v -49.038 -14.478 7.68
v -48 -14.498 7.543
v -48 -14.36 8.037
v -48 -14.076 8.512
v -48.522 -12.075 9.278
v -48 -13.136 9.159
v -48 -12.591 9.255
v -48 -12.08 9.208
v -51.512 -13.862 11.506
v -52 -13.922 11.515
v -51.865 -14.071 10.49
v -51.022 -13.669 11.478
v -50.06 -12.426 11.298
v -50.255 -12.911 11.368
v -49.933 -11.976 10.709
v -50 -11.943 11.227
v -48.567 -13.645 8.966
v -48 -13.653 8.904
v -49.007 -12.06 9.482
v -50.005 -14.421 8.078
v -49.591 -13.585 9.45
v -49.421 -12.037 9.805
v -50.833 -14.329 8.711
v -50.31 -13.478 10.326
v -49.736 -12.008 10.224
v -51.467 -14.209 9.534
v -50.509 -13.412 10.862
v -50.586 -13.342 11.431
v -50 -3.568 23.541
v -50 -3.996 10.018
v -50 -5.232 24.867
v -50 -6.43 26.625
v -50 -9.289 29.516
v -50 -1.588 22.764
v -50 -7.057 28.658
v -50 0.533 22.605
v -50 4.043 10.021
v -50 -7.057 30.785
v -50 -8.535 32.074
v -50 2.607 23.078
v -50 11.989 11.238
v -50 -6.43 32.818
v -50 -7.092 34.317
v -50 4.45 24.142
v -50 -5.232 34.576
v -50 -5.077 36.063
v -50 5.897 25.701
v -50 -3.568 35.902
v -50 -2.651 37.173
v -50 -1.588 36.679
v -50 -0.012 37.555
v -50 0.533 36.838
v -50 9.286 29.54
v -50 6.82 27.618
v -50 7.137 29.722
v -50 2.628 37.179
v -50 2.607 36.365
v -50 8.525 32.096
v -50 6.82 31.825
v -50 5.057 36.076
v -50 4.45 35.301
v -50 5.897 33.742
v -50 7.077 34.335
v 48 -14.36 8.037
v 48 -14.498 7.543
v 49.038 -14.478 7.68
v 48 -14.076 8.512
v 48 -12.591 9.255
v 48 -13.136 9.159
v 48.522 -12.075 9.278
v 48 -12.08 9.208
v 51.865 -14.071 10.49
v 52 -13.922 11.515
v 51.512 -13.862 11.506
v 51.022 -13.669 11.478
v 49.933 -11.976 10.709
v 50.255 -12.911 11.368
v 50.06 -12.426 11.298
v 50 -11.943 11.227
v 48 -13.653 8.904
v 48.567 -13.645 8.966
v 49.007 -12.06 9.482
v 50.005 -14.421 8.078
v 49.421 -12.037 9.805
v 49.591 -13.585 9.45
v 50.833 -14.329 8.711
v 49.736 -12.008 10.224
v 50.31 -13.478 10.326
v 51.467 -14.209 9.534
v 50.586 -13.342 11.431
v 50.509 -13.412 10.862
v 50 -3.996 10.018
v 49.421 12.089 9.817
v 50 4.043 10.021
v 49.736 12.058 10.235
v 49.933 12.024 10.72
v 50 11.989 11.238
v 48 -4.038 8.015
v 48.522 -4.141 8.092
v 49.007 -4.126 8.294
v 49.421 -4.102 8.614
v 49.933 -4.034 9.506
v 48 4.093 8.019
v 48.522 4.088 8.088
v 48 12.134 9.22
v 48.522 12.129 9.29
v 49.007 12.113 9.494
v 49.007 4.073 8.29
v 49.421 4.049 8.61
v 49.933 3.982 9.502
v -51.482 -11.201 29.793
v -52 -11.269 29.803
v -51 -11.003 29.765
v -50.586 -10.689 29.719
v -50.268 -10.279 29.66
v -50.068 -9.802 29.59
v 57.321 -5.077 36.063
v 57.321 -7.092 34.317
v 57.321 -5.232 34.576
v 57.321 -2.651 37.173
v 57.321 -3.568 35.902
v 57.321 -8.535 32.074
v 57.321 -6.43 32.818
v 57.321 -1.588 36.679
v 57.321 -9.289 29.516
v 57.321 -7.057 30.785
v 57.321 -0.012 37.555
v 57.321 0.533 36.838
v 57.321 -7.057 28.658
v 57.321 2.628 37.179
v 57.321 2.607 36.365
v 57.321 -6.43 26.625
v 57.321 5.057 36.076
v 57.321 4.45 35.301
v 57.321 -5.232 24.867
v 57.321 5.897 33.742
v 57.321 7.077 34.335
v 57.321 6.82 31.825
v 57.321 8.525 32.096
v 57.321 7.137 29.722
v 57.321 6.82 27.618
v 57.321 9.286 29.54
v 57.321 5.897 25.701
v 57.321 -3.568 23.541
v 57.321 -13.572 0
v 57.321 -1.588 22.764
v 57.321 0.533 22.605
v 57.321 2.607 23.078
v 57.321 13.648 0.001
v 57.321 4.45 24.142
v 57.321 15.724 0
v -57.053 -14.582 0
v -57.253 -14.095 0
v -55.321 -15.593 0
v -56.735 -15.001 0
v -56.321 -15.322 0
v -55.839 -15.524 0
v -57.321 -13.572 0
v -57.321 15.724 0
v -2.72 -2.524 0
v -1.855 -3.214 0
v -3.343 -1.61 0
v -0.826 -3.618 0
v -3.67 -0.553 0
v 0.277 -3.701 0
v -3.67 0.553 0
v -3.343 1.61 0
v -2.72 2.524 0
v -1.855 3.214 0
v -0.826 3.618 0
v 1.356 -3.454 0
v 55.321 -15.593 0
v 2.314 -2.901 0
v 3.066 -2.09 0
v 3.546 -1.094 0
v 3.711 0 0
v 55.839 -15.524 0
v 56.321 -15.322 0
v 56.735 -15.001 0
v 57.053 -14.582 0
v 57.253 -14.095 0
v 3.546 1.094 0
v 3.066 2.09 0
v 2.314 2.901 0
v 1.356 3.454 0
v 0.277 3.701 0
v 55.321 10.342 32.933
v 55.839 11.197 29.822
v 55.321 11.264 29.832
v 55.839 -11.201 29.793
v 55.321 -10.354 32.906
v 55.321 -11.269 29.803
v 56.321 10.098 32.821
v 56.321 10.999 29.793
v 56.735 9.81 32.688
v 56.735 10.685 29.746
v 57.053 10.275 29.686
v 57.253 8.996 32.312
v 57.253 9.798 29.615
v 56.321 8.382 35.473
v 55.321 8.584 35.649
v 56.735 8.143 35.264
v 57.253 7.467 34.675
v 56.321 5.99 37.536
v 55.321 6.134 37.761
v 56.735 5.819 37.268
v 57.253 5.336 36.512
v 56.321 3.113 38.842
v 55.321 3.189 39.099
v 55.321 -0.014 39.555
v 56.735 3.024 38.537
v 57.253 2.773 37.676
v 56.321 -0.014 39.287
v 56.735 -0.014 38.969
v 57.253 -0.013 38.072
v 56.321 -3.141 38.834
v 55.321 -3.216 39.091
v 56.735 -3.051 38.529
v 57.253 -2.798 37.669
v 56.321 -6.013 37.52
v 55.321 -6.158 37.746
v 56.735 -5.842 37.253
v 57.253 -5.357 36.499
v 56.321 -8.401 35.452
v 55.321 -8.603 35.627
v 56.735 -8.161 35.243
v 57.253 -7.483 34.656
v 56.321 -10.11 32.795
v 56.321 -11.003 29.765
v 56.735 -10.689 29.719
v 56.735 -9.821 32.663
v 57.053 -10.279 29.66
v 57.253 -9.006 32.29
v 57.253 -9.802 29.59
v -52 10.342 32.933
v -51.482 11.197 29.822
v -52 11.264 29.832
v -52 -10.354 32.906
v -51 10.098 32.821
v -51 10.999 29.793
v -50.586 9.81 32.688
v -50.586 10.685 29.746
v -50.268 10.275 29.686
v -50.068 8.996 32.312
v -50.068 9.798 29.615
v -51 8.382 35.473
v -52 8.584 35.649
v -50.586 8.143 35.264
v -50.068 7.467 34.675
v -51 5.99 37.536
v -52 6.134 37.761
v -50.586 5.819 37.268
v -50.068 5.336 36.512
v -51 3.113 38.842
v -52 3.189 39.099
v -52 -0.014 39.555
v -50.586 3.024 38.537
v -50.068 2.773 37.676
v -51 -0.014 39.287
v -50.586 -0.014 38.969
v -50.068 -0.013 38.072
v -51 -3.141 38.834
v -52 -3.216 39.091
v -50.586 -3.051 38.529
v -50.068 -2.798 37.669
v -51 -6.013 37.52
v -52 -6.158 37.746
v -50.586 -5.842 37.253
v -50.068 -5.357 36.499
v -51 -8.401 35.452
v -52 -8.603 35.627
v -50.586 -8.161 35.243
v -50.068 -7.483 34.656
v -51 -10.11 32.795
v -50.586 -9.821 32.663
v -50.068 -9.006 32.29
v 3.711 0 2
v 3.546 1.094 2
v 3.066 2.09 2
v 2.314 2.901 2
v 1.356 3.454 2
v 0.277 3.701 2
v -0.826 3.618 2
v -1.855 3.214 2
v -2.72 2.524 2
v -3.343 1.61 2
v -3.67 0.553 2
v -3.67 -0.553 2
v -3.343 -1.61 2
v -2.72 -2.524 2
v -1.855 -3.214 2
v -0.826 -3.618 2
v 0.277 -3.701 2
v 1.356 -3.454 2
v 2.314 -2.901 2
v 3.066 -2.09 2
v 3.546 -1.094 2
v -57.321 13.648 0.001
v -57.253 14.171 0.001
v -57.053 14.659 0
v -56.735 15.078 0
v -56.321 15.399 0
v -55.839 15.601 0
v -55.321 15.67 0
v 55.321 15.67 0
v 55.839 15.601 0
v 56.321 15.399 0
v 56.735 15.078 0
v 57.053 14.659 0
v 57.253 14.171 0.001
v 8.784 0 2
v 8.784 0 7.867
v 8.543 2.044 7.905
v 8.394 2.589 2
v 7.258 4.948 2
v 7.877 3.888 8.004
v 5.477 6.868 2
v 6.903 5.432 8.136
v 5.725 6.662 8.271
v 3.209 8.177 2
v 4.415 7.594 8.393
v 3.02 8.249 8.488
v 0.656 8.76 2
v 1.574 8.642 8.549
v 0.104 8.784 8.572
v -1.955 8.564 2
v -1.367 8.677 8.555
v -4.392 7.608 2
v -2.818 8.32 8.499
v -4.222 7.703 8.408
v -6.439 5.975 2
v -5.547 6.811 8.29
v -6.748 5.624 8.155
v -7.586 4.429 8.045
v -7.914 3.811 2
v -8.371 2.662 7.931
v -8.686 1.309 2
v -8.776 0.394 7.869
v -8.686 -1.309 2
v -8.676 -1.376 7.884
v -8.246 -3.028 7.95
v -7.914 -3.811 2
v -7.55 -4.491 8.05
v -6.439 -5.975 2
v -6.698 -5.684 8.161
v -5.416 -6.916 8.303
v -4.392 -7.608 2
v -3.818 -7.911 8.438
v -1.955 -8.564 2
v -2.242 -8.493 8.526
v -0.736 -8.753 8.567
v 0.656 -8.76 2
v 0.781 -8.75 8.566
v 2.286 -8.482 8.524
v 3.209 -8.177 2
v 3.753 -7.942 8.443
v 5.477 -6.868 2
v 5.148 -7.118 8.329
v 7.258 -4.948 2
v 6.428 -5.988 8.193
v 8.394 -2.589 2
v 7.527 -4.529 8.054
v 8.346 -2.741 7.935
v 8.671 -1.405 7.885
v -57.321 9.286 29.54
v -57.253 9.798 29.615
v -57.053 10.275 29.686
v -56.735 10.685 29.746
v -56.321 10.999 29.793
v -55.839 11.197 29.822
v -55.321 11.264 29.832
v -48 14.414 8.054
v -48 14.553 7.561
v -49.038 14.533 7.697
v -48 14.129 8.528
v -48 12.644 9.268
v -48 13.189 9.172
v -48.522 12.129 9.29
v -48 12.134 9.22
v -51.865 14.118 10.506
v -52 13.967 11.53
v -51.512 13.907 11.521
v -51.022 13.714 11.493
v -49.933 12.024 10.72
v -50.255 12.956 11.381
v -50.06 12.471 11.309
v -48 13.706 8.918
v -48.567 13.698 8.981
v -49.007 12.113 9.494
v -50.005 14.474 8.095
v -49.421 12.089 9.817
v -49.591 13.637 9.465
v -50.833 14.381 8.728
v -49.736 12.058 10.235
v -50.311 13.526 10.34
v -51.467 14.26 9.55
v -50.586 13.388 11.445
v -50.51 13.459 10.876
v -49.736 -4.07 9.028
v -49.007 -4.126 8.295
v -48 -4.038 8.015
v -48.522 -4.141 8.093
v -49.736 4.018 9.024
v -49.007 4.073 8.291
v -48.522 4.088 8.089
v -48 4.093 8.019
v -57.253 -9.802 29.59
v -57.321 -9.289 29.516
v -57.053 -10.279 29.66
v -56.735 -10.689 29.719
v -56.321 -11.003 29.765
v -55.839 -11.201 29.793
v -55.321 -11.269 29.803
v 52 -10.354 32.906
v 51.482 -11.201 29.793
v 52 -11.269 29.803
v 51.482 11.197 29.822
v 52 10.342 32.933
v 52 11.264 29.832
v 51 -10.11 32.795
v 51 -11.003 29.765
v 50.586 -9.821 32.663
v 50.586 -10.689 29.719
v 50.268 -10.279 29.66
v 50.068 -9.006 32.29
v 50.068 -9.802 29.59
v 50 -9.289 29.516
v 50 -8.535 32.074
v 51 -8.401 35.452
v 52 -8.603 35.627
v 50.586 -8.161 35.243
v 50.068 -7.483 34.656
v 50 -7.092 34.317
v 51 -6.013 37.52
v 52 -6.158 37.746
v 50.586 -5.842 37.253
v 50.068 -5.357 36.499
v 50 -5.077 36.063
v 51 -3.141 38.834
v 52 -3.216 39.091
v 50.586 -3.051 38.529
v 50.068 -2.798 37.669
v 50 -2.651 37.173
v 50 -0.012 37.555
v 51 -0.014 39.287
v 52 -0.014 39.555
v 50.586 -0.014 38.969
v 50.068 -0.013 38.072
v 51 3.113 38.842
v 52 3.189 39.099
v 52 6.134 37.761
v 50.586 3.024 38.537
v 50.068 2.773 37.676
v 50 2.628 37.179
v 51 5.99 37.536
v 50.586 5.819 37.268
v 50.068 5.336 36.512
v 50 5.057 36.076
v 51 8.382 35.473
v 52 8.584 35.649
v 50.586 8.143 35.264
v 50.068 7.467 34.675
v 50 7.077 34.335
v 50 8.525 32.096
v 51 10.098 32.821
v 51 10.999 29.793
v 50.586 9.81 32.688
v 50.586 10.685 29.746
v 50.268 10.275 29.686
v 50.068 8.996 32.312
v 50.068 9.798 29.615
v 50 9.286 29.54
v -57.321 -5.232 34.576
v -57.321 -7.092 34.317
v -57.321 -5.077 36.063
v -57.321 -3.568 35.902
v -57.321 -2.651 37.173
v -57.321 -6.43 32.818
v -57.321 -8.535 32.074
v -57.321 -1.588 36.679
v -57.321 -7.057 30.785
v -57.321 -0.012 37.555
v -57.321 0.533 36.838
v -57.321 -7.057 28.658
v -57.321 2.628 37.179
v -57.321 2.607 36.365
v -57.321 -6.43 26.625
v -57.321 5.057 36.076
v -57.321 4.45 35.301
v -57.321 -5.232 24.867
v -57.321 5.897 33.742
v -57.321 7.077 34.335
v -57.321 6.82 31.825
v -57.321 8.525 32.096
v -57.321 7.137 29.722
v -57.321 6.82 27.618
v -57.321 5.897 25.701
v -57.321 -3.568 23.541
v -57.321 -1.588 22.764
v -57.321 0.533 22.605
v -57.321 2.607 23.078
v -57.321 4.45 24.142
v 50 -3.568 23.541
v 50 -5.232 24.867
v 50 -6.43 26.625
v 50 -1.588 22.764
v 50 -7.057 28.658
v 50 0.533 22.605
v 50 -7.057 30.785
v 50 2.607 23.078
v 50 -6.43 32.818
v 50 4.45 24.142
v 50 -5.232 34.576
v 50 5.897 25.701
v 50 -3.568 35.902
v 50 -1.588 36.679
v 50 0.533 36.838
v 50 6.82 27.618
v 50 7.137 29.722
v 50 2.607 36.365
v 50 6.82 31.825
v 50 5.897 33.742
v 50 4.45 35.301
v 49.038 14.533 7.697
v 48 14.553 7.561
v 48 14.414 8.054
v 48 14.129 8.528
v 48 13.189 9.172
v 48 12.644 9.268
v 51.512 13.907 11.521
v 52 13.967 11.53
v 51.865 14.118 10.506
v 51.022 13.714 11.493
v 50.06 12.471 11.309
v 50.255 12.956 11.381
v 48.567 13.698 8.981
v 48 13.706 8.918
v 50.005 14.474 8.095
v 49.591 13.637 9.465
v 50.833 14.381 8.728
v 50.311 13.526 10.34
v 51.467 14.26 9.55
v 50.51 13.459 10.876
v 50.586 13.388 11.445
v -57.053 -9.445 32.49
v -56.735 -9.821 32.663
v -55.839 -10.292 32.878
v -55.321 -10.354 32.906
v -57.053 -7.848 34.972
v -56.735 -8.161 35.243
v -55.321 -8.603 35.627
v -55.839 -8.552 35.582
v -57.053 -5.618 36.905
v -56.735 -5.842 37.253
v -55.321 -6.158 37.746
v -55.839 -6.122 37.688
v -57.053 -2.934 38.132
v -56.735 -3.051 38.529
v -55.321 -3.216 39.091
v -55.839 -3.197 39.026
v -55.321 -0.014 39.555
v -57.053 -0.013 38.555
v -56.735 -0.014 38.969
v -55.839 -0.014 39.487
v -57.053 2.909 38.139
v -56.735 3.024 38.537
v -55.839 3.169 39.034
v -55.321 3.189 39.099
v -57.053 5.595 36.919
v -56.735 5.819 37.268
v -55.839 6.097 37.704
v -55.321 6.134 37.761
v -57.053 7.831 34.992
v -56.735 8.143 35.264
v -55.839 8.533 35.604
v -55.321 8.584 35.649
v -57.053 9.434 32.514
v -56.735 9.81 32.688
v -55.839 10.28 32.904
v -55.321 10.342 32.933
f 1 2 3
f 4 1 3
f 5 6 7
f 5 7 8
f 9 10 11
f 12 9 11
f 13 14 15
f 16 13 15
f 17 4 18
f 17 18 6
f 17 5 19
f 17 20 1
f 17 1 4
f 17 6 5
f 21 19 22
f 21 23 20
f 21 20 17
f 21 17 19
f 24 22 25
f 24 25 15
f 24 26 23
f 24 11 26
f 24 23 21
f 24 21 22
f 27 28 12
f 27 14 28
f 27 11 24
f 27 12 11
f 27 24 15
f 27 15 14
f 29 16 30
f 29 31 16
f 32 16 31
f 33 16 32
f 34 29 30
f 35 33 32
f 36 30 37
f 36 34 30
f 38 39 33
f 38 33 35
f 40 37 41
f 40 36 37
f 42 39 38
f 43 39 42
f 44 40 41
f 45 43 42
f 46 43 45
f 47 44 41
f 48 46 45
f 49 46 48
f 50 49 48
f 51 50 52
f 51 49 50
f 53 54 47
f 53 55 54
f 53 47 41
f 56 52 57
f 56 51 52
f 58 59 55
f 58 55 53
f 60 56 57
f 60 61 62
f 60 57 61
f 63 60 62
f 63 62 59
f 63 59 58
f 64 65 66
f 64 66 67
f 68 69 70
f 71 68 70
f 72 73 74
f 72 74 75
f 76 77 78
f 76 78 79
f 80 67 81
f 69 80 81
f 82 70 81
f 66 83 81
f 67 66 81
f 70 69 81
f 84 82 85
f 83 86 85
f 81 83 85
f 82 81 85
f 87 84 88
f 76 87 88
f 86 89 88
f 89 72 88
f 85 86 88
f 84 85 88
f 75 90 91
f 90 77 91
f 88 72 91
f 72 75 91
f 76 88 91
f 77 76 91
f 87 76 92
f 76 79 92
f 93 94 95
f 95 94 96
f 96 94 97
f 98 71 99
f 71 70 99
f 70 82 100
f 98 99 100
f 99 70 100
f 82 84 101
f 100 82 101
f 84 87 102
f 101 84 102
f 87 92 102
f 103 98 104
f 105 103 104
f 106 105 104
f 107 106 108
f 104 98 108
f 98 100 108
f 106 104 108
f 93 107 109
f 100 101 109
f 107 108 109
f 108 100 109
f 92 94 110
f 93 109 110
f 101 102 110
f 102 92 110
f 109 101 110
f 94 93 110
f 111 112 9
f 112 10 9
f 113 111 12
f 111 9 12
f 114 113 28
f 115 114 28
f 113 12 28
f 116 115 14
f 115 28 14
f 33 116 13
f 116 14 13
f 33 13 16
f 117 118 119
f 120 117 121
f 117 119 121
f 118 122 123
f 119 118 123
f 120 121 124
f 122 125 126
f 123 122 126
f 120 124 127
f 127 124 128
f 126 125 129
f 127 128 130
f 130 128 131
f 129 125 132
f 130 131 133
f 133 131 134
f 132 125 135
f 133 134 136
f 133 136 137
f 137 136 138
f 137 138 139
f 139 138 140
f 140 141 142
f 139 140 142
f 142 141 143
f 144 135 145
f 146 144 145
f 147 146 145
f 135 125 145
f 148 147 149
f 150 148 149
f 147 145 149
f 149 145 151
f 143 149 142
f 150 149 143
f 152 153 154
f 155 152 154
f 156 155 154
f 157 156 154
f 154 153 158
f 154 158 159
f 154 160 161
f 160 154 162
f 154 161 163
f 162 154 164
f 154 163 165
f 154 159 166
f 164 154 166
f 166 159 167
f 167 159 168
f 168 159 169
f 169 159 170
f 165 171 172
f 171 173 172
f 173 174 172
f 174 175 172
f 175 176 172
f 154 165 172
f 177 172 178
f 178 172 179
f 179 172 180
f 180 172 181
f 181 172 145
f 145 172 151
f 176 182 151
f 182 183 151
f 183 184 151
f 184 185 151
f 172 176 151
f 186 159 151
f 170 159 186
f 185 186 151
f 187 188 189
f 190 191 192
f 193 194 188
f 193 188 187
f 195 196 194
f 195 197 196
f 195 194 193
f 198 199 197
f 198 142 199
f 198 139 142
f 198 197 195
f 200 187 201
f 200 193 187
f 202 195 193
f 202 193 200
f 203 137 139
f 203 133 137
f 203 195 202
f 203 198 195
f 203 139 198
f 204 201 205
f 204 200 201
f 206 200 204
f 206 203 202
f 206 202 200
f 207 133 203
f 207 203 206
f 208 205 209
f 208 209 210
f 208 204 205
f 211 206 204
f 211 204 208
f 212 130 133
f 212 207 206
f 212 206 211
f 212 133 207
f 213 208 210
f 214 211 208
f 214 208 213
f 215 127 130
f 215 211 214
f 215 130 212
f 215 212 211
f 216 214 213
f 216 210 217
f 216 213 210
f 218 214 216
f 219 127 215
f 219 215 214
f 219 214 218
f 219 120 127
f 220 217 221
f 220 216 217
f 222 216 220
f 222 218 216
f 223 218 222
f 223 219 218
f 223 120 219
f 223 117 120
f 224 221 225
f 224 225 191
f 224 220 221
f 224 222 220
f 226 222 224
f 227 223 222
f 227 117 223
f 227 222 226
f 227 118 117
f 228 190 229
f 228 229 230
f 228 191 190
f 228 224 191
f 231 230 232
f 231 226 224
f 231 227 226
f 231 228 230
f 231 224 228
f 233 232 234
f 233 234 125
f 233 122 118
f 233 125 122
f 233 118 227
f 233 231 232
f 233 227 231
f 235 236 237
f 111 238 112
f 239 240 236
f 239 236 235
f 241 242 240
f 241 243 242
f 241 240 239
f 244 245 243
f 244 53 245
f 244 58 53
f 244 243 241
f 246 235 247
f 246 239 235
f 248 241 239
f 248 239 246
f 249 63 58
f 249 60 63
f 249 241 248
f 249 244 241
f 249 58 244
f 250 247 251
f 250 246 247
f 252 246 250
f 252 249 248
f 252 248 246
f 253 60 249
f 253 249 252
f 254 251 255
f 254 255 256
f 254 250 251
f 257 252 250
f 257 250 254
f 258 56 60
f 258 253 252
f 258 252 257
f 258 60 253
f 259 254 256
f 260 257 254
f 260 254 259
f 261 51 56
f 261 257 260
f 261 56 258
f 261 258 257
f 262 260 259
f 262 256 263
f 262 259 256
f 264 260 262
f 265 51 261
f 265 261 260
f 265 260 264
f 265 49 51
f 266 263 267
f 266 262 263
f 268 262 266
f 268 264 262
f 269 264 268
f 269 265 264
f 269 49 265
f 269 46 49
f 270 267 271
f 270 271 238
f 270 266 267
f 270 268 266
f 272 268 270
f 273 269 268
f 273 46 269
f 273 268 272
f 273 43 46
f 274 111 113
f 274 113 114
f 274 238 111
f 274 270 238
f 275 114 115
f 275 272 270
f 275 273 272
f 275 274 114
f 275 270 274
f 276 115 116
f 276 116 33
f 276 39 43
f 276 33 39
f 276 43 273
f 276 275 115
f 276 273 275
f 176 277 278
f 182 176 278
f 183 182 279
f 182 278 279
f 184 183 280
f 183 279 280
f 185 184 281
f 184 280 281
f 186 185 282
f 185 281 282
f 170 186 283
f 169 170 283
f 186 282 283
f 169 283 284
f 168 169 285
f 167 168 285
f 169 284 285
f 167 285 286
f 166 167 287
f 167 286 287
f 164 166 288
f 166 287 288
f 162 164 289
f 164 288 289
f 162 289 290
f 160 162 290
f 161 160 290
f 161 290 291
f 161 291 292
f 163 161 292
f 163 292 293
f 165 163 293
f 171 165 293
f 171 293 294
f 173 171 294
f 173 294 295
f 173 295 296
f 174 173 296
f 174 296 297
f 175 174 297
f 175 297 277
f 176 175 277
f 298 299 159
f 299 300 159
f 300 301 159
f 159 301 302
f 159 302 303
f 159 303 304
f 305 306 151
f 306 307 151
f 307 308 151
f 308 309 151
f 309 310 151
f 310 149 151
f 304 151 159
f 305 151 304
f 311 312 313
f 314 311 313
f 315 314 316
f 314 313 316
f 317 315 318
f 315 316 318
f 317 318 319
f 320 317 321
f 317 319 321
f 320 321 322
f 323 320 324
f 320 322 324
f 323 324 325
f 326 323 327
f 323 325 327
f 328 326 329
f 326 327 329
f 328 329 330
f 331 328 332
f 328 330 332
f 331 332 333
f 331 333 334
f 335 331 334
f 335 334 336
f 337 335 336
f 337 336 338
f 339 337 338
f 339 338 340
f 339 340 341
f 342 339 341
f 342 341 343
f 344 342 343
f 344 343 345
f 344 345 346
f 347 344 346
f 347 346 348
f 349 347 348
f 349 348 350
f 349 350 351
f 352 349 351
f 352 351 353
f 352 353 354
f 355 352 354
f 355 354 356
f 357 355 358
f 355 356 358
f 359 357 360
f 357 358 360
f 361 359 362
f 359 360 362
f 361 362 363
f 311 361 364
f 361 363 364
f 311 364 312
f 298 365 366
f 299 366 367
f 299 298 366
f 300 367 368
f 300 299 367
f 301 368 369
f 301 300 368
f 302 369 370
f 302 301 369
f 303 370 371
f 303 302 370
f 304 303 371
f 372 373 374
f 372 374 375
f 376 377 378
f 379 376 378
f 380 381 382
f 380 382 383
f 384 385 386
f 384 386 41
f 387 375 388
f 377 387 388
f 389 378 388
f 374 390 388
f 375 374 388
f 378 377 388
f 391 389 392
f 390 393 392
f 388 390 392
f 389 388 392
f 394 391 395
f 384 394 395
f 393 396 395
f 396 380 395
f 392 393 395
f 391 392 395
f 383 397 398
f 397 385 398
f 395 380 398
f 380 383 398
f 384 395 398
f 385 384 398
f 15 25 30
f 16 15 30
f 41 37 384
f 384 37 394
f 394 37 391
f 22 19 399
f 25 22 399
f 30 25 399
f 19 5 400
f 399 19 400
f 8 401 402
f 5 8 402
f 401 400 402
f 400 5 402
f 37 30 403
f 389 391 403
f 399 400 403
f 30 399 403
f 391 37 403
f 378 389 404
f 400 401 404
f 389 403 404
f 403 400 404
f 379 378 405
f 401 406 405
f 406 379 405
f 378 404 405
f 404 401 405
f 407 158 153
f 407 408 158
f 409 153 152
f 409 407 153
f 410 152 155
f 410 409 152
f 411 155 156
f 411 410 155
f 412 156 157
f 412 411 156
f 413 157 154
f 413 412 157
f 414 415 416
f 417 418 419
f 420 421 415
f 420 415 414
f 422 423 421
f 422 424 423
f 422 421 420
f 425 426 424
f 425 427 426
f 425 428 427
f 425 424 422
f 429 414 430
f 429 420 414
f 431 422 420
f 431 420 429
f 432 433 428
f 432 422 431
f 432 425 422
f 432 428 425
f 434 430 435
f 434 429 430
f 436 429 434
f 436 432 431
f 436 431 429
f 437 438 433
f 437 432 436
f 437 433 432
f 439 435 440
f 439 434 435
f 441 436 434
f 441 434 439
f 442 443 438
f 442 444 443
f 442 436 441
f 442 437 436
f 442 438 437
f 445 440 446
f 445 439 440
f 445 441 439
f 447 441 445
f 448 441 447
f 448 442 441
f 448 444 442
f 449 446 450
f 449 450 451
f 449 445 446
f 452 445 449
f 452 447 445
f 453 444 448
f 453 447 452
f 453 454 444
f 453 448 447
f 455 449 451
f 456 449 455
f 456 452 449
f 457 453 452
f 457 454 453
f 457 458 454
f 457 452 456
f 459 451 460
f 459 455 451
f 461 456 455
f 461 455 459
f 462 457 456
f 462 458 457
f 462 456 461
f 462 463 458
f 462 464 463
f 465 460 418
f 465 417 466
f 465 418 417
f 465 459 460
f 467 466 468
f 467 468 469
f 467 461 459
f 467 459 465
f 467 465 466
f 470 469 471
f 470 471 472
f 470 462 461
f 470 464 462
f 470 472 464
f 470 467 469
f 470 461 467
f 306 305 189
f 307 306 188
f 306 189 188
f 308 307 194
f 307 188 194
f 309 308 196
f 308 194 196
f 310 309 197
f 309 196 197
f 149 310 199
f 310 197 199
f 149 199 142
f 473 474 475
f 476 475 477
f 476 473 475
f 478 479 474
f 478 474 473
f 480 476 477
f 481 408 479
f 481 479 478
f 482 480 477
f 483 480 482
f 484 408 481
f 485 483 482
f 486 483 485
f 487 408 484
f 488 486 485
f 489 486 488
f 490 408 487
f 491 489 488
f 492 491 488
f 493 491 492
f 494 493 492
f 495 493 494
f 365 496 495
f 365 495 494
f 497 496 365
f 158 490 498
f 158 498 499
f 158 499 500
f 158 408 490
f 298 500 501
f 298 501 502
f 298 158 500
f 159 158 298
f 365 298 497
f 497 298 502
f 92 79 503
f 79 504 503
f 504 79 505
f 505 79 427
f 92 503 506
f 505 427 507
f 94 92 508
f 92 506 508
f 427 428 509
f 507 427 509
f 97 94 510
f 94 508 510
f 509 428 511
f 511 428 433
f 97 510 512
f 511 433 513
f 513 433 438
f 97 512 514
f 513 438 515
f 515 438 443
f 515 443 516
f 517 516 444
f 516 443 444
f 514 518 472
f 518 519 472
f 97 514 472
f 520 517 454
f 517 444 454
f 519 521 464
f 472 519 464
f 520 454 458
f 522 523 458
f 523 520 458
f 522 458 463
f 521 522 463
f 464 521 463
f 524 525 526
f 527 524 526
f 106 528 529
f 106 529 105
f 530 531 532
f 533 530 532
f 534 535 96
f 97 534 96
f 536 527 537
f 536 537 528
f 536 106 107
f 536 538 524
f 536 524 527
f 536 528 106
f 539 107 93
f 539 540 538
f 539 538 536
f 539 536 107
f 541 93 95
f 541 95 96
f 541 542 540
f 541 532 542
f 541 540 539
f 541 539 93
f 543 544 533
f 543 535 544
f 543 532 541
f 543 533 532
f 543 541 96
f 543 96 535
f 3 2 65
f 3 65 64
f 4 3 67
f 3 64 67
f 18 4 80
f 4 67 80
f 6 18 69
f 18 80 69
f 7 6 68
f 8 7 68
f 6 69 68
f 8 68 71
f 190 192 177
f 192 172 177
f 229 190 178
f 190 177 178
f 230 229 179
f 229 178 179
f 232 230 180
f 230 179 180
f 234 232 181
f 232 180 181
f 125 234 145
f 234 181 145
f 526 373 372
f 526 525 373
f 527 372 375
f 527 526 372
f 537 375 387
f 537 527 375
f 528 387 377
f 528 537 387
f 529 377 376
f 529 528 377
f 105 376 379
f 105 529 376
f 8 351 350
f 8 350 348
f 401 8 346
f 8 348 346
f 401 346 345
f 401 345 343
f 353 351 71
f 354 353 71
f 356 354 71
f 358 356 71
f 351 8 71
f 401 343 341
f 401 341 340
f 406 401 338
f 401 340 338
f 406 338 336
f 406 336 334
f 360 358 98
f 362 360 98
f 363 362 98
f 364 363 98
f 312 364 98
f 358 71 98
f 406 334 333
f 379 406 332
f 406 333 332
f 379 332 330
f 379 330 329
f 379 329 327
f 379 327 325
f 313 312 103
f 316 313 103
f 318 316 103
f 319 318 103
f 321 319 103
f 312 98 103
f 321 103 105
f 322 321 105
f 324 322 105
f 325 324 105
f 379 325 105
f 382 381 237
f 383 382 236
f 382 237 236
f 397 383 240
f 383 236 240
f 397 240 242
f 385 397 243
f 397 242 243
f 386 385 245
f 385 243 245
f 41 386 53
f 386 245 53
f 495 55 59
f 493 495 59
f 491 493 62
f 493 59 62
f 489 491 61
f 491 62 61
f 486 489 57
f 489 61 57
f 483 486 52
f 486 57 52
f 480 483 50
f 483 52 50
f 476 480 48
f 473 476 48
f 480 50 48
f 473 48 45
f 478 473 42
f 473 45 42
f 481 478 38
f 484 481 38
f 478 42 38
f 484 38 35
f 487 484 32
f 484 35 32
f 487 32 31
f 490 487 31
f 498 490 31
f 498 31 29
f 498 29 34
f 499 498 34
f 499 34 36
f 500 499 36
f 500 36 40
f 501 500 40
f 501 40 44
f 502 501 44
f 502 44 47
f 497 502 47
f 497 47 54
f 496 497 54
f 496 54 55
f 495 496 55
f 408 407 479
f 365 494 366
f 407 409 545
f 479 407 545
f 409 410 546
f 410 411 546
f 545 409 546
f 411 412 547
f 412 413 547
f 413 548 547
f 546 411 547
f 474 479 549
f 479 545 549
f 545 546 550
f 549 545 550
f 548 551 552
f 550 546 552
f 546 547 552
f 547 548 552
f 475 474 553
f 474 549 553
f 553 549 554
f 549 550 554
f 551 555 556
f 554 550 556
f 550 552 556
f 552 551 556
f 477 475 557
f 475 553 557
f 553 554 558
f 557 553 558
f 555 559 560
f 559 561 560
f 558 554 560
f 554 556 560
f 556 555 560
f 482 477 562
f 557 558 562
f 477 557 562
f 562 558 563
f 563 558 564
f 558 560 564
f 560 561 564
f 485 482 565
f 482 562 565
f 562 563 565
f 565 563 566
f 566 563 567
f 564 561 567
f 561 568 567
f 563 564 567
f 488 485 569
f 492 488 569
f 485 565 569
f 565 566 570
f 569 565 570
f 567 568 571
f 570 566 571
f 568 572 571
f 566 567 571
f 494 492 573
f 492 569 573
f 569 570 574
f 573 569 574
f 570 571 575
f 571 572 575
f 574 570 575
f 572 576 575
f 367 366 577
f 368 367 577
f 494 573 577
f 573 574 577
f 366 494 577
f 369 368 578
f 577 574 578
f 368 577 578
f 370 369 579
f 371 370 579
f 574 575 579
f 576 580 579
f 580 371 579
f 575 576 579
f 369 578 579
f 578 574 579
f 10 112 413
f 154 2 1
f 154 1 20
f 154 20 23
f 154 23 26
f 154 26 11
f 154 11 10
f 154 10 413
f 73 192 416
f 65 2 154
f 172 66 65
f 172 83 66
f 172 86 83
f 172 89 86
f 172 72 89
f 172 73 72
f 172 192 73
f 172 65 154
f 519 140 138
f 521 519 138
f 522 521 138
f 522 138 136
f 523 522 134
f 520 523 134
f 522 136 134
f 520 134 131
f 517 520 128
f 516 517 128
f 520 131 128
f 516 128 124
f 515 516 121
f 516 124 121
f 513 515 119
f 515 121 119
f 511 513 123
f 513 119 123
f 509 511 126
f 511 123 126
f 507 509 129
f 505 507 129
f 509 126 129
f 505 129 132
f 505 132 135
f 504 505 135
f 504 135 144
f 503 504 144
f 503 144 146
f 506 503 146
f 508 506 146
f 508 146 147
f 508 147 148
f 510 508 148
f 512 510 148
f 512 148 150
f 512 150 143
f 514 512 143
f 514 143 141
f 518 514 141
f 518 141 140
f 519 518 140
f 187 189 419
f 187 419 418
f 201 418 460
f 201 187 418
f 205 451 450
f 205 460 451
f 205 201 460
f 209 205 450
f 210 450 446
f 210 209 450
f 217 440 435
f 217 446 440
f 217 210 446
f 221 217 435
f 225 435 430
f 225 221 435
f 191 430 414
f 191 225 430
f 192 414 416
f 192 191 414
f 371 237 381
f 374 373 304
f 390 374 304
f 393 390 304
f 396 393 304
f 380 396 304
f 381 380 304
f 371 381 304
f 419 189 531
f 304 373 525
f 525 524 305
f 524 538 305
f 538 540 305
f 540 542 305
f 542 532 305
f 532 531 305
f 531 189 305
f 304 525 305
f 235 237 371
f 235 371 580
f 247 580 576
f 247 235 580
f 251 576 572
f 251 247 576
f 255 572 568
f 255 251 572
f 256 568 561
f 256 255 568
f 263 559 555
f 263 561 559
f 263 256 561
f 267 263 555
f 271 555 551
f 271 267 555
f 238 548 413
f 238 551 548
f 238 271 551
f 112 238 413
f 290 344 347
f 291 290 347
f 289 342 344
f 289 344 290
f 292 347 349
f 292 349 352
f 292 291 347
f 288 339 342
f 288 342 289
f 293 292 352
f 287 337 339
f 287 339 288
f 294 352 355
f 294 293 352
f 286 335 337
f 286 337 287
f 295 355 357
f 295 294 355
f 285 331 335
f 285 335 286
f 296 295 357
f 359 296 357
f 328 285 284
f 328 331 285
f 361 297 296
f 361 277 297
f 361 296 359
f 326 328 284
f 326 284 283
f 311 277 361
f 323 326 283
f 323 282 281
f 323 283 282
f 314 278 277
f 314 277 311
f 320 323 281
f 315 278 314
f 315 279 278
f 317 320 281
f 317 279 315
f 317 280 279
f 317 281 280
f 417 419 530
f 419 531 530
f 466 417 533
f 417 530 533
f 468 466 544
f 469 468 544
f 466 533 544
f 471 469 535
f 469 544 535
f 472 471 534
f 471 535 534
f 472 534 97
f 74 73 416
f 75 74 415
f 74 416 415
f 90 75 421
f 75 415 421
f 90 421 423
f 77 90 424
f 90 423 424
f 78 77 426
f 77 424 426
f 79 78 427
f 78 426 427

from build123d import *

# Parameters (mm, degrees)
SKETCH_W        = 114.642242
SKETCH_H        = 31.44759
PAD_DEPTH       = 40
POCKET_DEPTH    = 114.643242
SKETCH002_R     = 7.136669
POCKET001_DEPTH = 114.643242
SKETCH003_R     = 55.105675
POCKET002_DEPTH = 50
FILLET_R        = 2
SKETCH004_R     = 8.784385
POCKET003_DEPTH = 7
SKETCH005_R     = 3.710969
POCKET004_DEPTH = 2.001


with BuildPart() as part:
    # Sketch → Pad (new body)
    with BuildSketch(Plane.XY):
        Rectangle(SKETCH_W, SKETCH_H)
    extrude(amount=PAD_DEPTH)

    # Sketch001 (on Face3 of Pad) → Pocket (cut, through all)
    with BuildSketch(Plane.YZ.offset(57.321121)):
        with BuildLine():
            ThreePointArc((11.264383, 29.831773), (-0.014439, 39.554811), (-11.268565, 29.8032))
            Line((-11.268565, 29.8032), (-15.592646, 0))
            Line((-15.592646, 0), (-22.878534, 0))
            Line((-22.878534, 0), (-19.217968, 45.174706))
            Line((-19.217968, 45.174706), (19.051588, 45.174706))
            Line((19.051588, 45.174706), (24.010837, 0))
            Line((15.669825, 0.000428), (24.010837, 0))
            Line((11.264383, 29.831773), (15.669825, 0.000428))
        make_face()
    extrude(amount=-POCKET_DEPTH, mode=Mode.SUBTRACT)

    # Sketch002 (on Face8 of Pocket) → Pocket001 (cut, through all)
    with BuildSketch(Plane.YZ.offset(57.321121)):
        with Locations((0, 29.72154)):
            Circle(SKETCH002_R)
    extrude(amount=-POCKET001_DEPTH, mode=Mode.SUBTRACT)

    # Sketch003 → Pocket002 (cut, symmetric)
    with BuildSketch(Plane.YZ):
        with Locations((0, 62.972816)):
            Circle(SKETCH003_R)
    extrude(amount=POCKET002_DEPTH, both=True, mode=Mode.SUBTRACT)

    # Fillet
    fillet_edges = [part.edges().sort_by_distance(p)[0] for p in [
        (57.321121, -13.430606, 14.9016),
        (57.321121, -0.014439, 39.554811),
        (57.321121, 13.467104, 14.916101),
        (-57.321121, -13.430606, 14.9016),
        (-57.321121, -0.014439, 39.554811),
        (-57.321121, 13.467104, 14.916101),
        (50, 0.025916, 7.867147),
        (0, -14.181911, 9.72332),
        (0, 14.231991, 9.736683),
        (50, -12.725238, 19.76326),
        (50, -0.014439, 39.554811),
        (50, 12.748187, 19.784228),
        (-50, 12.748187, 19.784228),
        (-50, -0.014439, 39.554811),
        (-50, -12.725238, 19.76326),
        (-50, 0.025916, 7.867147),
    ]]
    fillet(fillet_edges, radius=FILLET_R)

    # Sketch004 → Pocket003 (cut)
    with BuildSketch(Plane.XY.offset(9)):
        Circle(SKETCH004_R)
    extrude(amount=-POCKET003_DEPTH, mode=Mode.SUBTRACT)

    # Sketch005 (on Face36 of Pocket003) → Pocket004 (cut, through all)
    with BuildSketch(Plane.XY.offset(2)):
        Circle(SKETCH005_R)
    extrude(amount=-POCKET004_DEPTH, mode=Mode.SUBTRACT)


solid = part.part
